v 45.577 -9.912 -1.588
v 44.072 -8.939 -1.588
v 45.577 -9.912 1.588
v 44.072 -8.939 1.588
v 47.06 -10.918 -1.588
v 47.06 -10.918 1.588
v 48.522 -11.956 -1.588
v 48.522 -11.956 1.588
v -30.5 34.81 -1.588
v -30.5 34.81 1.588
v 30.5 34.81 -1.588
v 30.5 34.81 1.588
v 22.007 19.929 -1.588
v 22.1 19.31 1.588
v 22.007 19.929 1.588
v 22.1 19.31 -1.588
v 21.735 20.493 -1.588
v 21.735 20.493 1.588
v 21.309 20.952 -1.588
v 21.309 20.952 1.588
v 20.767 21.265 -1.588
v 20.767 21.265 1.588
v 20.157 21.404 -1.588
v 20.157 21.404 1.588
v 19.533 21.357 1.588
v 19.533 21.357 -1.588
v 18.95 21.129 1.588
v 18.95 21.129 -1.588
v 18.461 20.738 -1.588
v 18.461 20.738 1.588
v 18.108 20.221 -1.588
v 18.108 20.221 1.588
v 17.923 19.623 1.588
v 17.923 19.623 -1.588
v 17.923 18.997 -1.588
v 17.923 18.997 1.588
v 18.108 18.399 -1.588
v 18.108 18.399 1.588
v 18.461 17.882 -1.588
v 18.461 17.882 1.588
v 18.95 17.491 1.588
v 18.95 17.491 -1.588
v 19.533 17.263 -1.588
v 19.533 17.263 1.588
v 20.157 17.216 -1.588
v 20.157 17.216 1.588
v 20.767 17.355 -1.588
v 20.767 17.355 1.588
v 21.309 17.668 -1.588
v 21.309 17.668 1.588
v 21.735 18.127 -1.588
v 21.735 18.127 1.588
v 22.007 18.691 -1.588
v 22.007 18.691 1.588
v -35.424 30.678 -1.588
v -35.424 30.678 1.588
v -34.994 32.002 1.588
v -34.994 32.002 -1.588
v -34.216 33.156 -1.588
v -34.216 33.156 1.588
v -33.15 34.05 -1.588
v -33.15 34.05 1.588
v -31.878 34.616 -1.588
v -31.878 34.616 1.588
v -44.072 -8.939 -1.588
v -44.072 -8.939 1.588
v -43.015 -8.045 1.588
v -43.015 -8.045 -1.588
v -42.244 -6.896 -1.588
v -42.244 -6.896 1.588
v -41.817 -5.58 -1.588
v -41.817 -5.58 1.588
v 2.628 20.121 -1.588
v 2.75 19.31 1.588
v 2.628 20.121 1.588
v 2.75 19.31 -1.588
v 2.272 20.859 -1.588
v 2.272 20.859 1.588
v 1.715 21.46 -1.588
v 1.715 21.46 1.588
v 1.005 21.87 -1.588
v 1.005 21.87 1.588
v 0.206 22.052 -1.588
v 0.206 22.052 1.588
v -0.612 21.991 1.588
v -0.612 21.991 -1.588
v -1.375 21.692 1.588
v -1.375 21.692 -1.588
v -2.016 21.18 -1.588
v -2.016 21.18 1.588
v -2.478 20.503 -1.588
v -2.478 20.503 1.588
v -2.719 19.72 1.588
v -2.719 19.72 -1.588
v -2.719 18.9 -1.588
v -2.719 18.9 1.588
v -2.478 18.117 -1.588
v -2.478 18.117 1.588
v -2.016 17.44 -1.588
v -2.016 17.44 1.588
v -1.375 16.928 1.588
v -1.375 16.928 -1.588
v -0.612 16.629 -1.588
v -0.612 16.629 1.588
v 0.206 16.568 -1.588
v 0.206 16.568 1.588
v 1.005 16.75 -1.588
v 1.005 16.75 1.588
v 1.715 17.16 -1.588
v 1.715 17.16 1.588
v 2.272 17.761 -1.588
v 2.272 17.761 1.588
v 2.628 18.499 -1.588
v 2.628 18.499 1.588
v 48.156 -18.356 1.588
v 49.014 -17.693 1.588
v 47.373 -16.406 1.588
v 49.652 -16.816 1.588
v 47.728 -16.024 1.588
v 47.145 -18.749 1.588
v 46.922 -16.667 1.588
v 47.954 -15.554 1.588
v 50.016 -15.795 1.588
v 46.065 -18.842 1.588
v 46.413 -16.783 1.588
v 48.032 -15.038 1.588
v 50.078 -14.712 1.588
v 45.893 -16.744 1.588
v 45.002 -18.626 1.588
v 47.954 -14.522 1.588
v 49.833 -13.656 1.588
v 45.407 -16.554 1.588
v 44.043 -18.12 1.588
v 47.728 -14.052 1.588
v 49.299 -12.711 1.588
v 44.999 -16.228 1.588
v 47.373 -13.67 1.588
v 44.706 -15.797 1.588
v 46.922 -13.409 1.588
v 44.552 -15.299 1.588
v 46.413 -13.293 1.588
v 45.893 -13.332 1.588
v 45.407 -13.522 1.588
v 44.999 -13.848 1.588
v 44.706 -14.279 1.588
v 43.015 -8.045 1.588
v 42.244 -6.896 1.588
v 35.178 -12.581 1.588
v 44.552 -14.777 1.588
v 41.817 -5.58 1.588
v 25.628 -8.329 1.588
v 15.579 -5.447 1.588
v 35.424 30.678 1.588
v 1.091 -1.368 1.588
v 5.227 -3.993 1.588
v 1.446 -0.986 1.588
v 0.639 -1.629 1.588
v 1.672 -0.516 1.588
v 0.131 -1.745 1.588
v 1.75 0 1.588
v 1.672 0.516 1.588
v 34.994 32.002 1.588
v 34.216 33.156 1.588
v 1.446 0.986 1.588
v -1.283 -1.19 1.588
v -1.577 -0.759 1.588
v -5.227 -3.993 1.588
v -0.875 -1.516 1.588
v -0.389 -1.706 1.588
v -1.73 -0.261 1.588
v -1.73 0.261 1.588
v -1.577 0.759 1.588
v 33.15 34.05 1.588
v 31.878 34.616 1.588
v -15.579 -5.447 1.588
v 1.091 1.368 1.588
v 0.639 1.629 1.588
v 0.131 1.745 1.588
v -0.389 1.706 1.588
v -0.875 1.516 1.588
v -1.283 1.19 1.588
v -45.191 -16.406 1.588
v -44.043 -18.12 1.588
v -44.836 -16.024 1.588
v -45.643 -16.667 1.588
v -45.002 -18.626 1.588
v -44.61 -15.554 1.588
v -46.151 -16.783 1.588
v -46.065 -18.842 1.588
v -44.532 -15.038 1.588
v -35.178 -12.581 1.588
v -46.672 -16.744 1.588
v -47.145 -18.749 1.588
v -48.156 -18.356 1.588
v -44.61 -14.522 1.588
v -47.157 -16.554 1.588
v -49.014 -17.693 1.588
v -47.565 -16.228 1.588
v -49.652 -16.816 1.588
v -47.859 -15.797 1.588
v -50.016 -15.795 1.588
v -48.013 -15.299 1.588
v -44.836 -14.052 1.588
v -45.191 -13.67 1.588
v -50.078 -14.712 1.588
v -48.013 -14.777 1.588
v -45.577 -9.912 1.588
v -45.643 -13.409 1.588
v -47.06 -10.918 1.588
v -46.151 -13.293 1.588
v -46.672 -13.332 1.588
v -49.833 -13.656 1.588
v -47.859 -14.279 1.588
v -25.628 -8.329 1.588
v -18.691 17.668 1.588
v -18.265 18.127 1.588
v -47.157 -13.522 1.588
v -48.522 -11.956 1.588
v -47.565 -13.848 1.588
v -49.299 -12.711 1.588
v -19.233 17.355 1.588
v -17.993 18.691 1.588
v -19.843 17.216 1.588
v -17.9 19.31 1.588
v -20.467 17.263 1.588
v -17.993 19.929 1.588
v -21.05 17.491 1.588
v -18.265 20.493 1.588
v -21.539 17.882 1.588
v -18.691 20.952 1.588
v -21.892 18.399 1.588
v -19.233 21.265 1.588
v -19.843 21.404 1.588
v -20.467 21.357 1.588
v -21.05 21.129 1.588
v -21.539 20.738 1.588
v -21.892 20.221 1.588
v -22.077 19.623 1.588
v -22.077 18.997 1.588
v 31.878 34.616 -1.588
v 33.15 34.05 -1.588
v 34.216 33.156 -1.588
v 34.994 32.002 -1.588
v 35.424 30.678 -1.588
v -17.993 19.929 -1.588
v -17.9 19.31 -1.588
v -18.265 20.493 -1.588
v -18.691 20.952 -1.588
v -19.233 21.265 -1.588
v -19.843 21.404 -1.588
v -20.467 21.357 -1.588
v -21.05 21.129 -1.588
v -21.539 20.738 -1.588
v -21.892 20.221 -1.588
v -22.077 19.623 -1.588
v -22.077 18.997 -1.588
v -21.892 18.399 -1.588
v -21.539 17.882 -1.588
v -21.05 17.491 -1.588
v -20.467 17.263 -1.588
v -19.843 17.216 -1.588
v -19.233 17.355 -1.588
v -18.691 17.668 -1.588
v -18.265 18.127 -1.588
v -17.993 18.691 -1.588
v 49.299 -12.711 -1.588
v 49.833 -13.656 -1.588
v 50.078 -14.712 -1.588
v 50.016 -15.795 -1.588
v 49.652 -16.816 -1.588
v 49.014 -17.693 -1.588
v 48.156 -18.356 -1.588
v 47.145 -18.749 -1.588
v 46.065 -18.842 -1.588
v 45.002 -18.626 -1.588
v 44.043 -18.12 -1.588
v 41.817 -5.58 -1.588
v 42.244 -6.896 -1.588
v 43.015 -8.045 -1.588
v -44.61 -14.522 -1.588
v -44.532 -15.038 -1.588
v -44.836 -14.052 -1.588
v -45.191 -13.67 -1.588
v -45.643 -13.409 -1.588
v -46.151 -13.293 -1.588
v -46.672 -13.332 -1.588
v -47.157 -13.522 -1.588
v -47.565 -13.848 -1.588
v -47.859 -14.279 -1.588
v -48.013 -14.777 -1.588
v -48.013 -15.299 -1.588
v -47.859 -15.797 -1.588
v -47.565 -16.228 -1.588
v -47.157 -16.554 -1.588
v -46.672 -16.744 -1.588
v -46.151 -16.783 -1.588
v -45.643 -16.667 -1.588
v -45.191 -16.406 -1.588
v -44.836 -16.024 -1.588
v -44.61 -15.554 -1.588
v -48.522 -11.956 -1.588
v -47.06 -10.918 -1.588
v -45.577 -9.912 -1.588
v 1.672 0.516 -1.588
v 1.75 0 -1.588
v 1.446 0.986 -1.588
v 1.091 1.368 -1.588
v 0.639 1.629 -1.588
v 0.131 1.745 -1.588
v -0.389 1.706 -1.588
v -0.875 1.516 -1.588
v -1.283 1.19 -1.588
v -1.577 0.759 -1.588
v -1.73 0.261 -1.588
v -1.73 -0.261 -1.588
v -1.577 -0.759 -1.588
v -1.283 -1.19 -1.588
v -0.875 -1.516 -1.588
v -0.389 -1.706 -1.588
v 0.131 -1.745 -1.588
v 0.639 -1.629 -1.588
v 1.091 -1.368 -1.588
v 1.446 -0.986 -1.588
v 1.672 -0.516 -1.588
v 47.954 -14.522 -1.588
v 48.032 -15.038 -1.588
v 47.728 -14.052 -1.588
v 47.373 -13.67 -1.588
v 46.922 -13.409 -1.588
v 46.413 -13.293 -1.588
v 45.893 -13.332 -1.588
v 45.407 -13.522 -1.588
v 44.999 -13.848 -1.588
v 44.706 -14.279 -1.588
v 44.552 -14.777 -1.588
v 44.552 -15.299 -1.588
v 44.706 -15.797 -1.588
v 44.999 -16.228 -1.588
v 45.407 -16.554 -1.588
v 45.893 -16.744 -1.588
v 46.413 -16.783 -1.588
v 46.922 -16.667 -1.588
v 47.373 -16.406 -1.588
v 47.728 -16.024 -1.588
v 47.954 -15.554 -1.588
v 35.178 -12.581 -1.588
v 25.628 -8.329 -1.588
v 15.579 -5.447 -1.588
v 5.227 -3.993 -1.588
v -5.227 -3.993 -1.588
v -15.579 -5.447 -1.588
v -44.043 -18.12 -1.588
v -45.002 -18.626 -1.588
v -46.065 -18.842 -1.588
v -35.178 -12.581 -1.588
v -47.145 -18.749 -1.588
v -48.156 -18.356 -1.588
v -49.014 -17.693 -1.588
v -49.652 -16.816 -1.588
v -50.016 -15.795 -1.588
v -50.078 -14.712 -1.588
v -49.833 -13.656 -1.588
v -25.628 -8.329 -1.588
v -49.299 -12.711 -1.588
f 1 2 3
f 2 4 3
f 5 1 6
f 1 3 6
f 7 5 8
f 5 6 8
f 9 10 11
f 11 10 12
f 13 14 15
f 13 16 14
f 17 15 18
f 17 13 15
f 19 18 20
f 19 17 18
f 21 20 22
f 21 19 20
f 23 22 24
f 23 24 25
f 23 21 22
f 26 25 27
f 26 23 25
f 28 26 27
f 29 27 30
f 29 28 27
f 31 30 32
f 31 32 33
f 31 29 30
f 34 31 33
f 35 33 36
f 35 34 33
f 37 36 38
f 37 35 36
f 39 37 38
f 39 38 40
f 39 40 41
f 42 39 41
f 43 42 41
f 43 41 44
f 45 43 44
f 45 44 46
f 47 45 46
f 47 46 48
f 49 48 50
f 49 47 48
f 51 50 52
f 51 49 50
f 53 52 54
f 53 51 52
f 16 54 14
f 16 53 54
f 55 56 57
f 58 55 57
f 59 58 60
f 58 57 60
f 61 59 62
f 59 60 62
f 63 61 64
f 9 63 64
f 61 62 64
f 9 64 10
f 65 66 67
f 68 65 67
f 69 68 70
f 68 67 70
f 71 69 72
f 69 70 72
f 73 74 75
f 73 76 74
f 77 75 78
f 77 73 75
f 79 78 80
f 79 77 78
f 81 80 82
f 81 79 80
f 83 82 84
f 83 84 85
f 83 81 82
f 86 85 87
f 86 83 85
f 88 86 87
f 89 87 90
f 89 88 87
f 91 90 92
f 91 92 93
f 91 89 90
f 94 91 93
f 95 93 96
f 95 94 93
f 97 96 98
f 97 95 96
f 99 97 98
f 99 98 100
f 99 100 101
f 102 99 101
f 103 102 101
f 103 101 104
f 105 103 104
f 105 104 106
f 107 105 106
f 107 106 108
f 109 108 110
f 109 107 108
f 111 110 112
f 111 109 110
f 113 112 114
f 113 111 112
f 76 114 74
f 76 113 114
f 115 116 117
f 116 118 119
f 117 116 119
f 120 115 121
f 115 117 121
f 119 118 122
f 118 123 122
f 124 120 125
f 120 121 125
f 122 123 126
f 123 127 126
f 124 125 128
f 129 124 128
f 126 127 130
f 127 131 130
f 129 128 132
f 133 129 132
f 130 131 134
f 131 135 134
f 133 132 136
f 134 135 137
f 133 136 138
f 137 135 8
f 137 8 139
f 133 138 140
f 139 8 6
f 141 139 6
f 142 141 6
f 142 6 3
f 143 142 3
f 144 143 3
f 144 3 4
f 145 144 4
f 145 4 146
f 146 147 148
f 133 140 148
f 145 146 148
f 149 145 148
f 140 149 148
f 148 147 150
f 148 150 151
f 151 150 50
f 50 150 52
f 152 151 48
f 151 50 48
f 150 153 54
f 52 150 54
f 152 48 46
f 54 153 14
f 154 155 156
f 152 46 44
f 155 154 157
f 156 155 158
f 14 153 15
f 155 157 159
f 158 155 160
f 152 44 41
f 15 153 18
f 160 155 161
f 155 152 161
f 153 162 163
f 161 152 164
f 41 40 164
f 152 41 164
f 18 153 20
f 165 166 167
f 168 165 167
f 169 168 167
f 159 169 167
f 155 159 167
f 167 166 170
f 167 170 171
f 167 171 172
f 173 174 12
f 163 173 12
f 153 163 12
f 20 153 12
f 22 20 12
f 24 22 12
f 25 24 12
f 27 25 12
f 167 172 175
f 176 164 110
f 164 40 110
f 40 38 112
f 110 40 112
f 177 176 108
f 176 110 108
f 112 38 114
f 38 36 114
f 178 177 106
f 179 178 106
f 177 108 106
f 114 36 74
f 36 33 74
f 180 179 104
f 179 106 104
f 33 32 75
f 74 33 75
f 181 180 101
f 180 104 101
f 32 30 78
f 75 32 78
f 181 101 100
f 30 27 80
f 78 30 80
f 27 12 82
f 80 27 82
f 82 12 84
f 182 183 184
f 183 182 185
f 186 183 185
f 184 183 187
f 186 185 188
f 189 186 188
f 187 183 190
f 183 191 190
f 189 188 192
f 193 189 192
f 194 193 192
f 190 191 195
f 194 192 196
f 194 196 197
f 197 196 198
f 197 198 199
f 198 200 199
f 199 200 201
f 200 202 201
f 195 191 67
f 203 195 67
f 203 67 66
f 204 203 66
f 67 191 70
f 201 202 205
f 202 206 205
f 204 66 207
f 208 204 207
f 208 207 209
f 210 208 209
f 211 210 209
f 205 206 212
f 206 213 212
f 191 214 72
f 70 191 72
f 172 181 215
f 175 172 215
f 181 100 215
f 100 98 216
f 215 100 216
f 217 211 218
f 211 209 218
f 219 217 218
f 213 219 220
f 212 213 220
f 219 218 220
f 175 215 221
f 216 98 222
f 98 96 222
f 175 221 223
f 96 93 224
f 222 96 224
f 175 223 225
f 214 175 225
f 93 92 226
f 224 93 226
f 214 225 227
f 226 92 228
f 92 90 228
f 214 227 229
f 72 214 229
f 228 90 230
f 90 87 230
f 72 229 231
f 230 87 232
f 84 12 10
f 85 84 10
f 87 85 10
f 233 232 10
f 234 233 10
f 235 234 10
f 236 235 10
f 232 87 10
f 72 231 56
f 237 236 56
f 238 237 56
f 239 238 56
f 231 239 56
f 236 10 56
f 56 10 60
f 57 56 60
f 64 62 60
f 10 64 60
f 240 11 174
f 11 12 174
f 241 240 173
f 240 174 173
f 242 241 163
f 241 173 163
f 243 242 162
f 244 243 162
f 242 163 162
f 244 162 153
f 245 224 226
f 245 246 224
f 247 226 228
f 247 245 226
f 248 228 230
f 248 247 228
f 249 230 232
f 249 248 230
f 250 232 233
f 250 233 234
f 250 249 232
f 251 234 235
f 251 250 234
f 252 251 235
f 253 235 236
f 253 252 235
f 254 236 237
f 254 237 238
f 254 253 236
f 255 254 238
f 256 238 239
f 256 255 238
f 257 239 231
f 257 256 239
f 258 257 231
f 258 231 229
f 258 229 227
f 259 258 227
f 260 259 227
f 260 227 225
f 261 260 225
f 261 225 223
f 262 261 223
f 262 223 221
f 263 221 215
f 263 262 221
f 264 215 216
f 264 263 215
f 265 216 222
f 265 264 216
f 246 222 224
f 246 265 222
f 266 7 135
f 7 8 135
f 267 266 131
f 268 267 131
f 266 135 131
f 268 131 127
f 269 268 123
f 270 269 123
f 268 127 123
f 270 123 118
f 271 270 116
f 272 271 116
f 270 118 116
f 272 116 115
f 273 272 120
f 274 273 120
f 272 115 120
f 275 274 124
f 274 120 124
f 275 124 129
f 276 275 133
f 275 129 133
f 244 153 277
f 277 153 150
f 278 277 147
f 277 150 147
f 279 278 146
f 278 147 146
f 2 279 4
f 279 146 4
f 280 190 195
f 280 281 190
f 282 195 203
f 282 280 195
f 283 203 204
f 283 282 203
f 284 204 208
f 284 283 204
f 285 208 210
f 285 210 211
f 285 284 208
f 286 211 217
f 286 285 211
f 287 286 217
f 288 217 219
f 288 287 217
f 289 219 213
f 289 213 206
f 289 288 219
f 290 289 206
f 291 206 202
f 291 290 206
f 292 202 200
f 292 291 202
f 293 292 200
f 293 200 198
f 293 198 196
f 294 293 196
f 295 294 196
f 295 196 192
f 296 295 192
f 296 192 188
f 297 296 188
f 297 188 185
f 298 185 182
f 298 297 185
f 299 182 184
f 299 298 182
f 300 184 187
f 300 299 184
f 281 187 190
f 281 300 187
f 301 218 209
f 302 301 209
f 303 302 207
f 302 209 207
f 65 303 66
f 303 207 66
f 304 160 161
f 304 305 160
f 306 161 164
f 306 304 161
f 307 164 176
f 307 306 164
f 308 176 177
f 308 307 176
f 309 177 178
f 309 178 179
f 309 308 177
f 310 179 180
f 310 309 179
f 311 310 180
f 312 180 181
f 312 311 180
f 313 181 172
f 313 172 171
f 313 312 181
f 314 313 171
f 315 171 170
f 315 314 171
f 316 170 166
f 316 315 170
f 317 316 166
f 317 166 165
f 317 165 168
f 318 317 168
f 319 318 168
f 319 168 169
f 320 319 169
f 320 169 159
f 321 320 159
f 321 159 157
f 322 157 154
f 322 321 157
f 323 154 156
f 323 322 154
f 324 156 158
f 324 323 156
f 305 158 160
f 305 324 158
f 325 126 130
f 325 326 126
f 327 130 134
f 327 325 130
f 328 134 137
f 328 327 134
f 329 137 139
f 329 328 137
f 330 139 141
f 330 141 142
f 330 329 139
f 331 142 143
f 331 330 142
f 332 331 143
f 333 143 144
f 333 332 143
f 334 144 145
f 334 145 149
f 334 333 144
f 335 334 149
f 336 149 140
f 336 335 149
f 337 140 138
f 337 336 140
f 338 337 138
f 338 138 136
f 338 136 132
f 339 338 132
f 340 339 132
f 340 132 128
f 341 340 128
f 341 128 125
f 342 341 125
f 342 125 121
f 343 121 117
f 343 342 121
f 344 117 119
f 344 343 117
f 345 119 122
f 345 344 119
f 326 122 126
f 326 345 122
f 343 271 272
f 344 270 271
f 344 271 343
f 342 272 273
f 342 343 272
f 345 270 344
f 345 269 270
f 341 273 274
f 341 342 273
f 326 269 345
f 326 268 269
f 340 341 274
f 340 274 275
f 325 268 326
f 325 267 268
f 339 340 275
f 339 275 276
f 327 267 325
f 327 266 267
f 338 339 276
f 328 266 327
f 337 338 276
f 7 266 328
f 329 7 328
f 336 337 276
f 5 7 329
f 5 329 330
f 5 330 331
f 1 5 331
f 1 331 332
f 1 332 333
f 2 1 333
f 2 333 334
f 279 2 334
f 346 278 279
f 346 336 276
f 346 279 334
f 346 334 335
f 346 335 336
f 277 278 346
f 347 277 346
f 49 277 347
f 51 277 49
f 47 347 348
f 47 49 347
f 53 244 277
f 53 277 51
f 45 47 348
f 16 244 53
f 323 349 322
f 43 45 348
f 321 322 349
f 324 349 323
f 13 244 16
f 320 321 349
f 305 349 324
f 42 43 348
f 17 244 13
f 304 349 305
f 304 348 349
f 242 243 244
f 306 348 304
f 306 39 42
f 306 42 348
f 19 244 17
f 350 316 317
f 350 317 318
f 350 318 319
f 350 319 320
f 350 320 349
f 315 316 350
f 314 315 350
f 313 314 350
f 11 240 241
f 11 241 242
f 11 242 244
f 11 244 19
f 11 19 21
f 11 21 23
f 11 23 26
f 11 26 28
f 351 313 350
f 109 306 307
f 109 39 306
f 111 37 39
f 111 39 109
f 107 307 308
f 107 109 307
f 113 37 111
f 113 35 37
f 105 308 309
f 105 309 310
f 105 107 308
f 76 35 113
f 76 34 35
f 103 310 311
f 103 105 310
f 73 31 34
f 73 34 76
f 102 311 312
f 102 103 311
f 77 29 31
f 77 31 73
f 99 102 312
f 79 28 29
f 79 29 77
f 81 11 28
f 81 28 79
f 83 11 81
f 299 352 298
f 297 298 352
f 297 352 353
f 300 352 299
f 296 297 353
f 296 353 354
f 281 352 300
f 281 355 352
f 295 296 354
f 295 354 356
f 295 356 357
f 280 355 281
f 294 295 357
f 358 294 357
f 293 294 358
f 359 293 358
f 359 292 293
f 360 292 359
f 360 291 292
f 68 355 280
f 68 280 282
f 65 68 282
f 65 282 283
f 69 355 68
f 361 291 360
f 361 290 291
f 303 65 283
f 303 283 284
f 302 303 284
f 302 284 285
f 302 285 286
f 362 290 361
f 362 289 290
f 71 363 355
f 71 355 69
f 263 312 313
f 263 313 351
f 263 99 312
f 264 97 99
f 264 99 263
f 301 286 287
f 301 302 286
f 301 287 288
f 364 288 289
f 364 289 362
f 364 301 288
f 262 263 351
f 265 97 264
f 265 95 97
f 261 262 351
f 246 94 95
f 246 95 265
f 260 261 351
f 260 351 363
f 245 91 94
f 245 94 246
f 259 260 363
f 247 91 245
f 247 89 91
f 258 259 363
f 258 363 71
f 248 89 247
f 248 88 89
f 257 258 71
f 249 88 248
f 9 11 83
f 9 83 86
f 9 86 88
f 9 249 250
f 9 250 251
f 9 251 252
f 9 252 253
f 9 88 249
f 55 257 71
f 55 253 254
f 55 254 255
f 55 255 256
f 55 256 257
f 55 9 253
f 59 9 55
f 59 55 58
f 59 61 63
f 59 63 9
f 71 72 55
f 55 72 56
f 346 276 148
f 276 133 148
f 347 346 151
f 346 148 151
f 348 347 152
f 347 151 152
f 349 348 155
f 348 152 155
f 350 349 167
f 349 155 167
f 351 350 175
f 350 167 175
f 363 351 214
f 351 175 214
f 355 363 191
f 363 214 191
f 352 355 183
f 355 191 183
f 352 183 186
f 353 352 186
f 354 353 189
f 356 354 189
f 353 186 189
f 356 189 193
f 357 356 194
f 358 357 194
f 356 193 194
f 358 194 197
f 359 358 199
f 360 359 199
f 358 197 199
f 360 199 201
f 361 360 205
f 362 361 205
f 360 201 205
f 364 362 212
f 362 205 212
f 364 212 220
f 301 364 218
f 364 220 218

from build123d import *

# Parameters (mm, degrees)
SKETCH1_R           = 1.75
SKETCH1_R_2         = 2.1
SKETCH1_R_3         = 2.75
BOSS_EXTRUDE1_DEPTH = 1.5875


with BuildPart() as part:
    # Sketch1 → Boss-Extrude1 (new, symmetric)
    with BuildSketch(Plane.XY):
        with BuildLine():
            Line((-30.5, 34.81), (30.5, 34.81))
            ThreePointArc((30.5, 34.81), (33.713938048, 33.640222216), (35.424038765, 30.678240888))
            Line((35.424038765, 30.678240888), (41.817257659, -5.579505193))
            ThreePointArc((41.817257659, -5.579505193), (42.58957924, -7.49752424), (44.071890575, -8.939061889))
            ThreePointArc((44.071890575, -8.939061889), (46.321344226, -10.411121997), (48.521672577, -11.955647114))
            ThreePointArc((48.521672577, -11.955647114), (49.364565514, -17.277463674), (44.042748954, -18.120356611))
            ThreePointArc((44.042748954, -18.120356611), (0, -3.81), (-44.042748954, -18.120356611))
            ThreePointArc((-44.042748954, -18.120356611), (-49.364565514, -17.277463674), (-48.521672577, -11.955647114))
            ThreePointArc((-48.521672577, -11.955647114), (-46.321344226, -10.411121997), (-44.071890575, -8.939061889))
            ThreePointArc((-44.071890575, -8.939061889), (-42.58957924, -7.49752424), (-41.817257659, -5.579505193))
            Line((-41.817257659, -5.579505193), (-35.424038765, 30.678240888))
            ThreePointArc((-35.424038765, 30.678240888), (-33.713938048, 33.640222216), (-30.5, 34.81))
        make_face()
        Circle(SKETCH1_R, mode=Mode.SUBTRACT)
        with Locations((-46.282210766, -15.038001863)):
            Circle(SKETCH1_R, mode=Mode.SUBTRACT)
        with Locations((46.282210766, -15.038001863)):
            Circle(SKETCH1_R, mode=Mode.SUBTRACT)
        with Locations((-20, 19.31)):
            Circle(SKETCH1_R_2, mode=Mode.SUBTRACT)
        with Locations((20, 19.31)):
            Circle(SKETCH1_R_2, mode=Mode.SUBTRACT)
        with Locations((0, 19.31)):
            Circle(SKETCH1_R_3, mode=Mode.SUBTRACT)
    extrude(amount=BOSS_EXTRUDE1_DEPTH, both=True)


solid = part.part
